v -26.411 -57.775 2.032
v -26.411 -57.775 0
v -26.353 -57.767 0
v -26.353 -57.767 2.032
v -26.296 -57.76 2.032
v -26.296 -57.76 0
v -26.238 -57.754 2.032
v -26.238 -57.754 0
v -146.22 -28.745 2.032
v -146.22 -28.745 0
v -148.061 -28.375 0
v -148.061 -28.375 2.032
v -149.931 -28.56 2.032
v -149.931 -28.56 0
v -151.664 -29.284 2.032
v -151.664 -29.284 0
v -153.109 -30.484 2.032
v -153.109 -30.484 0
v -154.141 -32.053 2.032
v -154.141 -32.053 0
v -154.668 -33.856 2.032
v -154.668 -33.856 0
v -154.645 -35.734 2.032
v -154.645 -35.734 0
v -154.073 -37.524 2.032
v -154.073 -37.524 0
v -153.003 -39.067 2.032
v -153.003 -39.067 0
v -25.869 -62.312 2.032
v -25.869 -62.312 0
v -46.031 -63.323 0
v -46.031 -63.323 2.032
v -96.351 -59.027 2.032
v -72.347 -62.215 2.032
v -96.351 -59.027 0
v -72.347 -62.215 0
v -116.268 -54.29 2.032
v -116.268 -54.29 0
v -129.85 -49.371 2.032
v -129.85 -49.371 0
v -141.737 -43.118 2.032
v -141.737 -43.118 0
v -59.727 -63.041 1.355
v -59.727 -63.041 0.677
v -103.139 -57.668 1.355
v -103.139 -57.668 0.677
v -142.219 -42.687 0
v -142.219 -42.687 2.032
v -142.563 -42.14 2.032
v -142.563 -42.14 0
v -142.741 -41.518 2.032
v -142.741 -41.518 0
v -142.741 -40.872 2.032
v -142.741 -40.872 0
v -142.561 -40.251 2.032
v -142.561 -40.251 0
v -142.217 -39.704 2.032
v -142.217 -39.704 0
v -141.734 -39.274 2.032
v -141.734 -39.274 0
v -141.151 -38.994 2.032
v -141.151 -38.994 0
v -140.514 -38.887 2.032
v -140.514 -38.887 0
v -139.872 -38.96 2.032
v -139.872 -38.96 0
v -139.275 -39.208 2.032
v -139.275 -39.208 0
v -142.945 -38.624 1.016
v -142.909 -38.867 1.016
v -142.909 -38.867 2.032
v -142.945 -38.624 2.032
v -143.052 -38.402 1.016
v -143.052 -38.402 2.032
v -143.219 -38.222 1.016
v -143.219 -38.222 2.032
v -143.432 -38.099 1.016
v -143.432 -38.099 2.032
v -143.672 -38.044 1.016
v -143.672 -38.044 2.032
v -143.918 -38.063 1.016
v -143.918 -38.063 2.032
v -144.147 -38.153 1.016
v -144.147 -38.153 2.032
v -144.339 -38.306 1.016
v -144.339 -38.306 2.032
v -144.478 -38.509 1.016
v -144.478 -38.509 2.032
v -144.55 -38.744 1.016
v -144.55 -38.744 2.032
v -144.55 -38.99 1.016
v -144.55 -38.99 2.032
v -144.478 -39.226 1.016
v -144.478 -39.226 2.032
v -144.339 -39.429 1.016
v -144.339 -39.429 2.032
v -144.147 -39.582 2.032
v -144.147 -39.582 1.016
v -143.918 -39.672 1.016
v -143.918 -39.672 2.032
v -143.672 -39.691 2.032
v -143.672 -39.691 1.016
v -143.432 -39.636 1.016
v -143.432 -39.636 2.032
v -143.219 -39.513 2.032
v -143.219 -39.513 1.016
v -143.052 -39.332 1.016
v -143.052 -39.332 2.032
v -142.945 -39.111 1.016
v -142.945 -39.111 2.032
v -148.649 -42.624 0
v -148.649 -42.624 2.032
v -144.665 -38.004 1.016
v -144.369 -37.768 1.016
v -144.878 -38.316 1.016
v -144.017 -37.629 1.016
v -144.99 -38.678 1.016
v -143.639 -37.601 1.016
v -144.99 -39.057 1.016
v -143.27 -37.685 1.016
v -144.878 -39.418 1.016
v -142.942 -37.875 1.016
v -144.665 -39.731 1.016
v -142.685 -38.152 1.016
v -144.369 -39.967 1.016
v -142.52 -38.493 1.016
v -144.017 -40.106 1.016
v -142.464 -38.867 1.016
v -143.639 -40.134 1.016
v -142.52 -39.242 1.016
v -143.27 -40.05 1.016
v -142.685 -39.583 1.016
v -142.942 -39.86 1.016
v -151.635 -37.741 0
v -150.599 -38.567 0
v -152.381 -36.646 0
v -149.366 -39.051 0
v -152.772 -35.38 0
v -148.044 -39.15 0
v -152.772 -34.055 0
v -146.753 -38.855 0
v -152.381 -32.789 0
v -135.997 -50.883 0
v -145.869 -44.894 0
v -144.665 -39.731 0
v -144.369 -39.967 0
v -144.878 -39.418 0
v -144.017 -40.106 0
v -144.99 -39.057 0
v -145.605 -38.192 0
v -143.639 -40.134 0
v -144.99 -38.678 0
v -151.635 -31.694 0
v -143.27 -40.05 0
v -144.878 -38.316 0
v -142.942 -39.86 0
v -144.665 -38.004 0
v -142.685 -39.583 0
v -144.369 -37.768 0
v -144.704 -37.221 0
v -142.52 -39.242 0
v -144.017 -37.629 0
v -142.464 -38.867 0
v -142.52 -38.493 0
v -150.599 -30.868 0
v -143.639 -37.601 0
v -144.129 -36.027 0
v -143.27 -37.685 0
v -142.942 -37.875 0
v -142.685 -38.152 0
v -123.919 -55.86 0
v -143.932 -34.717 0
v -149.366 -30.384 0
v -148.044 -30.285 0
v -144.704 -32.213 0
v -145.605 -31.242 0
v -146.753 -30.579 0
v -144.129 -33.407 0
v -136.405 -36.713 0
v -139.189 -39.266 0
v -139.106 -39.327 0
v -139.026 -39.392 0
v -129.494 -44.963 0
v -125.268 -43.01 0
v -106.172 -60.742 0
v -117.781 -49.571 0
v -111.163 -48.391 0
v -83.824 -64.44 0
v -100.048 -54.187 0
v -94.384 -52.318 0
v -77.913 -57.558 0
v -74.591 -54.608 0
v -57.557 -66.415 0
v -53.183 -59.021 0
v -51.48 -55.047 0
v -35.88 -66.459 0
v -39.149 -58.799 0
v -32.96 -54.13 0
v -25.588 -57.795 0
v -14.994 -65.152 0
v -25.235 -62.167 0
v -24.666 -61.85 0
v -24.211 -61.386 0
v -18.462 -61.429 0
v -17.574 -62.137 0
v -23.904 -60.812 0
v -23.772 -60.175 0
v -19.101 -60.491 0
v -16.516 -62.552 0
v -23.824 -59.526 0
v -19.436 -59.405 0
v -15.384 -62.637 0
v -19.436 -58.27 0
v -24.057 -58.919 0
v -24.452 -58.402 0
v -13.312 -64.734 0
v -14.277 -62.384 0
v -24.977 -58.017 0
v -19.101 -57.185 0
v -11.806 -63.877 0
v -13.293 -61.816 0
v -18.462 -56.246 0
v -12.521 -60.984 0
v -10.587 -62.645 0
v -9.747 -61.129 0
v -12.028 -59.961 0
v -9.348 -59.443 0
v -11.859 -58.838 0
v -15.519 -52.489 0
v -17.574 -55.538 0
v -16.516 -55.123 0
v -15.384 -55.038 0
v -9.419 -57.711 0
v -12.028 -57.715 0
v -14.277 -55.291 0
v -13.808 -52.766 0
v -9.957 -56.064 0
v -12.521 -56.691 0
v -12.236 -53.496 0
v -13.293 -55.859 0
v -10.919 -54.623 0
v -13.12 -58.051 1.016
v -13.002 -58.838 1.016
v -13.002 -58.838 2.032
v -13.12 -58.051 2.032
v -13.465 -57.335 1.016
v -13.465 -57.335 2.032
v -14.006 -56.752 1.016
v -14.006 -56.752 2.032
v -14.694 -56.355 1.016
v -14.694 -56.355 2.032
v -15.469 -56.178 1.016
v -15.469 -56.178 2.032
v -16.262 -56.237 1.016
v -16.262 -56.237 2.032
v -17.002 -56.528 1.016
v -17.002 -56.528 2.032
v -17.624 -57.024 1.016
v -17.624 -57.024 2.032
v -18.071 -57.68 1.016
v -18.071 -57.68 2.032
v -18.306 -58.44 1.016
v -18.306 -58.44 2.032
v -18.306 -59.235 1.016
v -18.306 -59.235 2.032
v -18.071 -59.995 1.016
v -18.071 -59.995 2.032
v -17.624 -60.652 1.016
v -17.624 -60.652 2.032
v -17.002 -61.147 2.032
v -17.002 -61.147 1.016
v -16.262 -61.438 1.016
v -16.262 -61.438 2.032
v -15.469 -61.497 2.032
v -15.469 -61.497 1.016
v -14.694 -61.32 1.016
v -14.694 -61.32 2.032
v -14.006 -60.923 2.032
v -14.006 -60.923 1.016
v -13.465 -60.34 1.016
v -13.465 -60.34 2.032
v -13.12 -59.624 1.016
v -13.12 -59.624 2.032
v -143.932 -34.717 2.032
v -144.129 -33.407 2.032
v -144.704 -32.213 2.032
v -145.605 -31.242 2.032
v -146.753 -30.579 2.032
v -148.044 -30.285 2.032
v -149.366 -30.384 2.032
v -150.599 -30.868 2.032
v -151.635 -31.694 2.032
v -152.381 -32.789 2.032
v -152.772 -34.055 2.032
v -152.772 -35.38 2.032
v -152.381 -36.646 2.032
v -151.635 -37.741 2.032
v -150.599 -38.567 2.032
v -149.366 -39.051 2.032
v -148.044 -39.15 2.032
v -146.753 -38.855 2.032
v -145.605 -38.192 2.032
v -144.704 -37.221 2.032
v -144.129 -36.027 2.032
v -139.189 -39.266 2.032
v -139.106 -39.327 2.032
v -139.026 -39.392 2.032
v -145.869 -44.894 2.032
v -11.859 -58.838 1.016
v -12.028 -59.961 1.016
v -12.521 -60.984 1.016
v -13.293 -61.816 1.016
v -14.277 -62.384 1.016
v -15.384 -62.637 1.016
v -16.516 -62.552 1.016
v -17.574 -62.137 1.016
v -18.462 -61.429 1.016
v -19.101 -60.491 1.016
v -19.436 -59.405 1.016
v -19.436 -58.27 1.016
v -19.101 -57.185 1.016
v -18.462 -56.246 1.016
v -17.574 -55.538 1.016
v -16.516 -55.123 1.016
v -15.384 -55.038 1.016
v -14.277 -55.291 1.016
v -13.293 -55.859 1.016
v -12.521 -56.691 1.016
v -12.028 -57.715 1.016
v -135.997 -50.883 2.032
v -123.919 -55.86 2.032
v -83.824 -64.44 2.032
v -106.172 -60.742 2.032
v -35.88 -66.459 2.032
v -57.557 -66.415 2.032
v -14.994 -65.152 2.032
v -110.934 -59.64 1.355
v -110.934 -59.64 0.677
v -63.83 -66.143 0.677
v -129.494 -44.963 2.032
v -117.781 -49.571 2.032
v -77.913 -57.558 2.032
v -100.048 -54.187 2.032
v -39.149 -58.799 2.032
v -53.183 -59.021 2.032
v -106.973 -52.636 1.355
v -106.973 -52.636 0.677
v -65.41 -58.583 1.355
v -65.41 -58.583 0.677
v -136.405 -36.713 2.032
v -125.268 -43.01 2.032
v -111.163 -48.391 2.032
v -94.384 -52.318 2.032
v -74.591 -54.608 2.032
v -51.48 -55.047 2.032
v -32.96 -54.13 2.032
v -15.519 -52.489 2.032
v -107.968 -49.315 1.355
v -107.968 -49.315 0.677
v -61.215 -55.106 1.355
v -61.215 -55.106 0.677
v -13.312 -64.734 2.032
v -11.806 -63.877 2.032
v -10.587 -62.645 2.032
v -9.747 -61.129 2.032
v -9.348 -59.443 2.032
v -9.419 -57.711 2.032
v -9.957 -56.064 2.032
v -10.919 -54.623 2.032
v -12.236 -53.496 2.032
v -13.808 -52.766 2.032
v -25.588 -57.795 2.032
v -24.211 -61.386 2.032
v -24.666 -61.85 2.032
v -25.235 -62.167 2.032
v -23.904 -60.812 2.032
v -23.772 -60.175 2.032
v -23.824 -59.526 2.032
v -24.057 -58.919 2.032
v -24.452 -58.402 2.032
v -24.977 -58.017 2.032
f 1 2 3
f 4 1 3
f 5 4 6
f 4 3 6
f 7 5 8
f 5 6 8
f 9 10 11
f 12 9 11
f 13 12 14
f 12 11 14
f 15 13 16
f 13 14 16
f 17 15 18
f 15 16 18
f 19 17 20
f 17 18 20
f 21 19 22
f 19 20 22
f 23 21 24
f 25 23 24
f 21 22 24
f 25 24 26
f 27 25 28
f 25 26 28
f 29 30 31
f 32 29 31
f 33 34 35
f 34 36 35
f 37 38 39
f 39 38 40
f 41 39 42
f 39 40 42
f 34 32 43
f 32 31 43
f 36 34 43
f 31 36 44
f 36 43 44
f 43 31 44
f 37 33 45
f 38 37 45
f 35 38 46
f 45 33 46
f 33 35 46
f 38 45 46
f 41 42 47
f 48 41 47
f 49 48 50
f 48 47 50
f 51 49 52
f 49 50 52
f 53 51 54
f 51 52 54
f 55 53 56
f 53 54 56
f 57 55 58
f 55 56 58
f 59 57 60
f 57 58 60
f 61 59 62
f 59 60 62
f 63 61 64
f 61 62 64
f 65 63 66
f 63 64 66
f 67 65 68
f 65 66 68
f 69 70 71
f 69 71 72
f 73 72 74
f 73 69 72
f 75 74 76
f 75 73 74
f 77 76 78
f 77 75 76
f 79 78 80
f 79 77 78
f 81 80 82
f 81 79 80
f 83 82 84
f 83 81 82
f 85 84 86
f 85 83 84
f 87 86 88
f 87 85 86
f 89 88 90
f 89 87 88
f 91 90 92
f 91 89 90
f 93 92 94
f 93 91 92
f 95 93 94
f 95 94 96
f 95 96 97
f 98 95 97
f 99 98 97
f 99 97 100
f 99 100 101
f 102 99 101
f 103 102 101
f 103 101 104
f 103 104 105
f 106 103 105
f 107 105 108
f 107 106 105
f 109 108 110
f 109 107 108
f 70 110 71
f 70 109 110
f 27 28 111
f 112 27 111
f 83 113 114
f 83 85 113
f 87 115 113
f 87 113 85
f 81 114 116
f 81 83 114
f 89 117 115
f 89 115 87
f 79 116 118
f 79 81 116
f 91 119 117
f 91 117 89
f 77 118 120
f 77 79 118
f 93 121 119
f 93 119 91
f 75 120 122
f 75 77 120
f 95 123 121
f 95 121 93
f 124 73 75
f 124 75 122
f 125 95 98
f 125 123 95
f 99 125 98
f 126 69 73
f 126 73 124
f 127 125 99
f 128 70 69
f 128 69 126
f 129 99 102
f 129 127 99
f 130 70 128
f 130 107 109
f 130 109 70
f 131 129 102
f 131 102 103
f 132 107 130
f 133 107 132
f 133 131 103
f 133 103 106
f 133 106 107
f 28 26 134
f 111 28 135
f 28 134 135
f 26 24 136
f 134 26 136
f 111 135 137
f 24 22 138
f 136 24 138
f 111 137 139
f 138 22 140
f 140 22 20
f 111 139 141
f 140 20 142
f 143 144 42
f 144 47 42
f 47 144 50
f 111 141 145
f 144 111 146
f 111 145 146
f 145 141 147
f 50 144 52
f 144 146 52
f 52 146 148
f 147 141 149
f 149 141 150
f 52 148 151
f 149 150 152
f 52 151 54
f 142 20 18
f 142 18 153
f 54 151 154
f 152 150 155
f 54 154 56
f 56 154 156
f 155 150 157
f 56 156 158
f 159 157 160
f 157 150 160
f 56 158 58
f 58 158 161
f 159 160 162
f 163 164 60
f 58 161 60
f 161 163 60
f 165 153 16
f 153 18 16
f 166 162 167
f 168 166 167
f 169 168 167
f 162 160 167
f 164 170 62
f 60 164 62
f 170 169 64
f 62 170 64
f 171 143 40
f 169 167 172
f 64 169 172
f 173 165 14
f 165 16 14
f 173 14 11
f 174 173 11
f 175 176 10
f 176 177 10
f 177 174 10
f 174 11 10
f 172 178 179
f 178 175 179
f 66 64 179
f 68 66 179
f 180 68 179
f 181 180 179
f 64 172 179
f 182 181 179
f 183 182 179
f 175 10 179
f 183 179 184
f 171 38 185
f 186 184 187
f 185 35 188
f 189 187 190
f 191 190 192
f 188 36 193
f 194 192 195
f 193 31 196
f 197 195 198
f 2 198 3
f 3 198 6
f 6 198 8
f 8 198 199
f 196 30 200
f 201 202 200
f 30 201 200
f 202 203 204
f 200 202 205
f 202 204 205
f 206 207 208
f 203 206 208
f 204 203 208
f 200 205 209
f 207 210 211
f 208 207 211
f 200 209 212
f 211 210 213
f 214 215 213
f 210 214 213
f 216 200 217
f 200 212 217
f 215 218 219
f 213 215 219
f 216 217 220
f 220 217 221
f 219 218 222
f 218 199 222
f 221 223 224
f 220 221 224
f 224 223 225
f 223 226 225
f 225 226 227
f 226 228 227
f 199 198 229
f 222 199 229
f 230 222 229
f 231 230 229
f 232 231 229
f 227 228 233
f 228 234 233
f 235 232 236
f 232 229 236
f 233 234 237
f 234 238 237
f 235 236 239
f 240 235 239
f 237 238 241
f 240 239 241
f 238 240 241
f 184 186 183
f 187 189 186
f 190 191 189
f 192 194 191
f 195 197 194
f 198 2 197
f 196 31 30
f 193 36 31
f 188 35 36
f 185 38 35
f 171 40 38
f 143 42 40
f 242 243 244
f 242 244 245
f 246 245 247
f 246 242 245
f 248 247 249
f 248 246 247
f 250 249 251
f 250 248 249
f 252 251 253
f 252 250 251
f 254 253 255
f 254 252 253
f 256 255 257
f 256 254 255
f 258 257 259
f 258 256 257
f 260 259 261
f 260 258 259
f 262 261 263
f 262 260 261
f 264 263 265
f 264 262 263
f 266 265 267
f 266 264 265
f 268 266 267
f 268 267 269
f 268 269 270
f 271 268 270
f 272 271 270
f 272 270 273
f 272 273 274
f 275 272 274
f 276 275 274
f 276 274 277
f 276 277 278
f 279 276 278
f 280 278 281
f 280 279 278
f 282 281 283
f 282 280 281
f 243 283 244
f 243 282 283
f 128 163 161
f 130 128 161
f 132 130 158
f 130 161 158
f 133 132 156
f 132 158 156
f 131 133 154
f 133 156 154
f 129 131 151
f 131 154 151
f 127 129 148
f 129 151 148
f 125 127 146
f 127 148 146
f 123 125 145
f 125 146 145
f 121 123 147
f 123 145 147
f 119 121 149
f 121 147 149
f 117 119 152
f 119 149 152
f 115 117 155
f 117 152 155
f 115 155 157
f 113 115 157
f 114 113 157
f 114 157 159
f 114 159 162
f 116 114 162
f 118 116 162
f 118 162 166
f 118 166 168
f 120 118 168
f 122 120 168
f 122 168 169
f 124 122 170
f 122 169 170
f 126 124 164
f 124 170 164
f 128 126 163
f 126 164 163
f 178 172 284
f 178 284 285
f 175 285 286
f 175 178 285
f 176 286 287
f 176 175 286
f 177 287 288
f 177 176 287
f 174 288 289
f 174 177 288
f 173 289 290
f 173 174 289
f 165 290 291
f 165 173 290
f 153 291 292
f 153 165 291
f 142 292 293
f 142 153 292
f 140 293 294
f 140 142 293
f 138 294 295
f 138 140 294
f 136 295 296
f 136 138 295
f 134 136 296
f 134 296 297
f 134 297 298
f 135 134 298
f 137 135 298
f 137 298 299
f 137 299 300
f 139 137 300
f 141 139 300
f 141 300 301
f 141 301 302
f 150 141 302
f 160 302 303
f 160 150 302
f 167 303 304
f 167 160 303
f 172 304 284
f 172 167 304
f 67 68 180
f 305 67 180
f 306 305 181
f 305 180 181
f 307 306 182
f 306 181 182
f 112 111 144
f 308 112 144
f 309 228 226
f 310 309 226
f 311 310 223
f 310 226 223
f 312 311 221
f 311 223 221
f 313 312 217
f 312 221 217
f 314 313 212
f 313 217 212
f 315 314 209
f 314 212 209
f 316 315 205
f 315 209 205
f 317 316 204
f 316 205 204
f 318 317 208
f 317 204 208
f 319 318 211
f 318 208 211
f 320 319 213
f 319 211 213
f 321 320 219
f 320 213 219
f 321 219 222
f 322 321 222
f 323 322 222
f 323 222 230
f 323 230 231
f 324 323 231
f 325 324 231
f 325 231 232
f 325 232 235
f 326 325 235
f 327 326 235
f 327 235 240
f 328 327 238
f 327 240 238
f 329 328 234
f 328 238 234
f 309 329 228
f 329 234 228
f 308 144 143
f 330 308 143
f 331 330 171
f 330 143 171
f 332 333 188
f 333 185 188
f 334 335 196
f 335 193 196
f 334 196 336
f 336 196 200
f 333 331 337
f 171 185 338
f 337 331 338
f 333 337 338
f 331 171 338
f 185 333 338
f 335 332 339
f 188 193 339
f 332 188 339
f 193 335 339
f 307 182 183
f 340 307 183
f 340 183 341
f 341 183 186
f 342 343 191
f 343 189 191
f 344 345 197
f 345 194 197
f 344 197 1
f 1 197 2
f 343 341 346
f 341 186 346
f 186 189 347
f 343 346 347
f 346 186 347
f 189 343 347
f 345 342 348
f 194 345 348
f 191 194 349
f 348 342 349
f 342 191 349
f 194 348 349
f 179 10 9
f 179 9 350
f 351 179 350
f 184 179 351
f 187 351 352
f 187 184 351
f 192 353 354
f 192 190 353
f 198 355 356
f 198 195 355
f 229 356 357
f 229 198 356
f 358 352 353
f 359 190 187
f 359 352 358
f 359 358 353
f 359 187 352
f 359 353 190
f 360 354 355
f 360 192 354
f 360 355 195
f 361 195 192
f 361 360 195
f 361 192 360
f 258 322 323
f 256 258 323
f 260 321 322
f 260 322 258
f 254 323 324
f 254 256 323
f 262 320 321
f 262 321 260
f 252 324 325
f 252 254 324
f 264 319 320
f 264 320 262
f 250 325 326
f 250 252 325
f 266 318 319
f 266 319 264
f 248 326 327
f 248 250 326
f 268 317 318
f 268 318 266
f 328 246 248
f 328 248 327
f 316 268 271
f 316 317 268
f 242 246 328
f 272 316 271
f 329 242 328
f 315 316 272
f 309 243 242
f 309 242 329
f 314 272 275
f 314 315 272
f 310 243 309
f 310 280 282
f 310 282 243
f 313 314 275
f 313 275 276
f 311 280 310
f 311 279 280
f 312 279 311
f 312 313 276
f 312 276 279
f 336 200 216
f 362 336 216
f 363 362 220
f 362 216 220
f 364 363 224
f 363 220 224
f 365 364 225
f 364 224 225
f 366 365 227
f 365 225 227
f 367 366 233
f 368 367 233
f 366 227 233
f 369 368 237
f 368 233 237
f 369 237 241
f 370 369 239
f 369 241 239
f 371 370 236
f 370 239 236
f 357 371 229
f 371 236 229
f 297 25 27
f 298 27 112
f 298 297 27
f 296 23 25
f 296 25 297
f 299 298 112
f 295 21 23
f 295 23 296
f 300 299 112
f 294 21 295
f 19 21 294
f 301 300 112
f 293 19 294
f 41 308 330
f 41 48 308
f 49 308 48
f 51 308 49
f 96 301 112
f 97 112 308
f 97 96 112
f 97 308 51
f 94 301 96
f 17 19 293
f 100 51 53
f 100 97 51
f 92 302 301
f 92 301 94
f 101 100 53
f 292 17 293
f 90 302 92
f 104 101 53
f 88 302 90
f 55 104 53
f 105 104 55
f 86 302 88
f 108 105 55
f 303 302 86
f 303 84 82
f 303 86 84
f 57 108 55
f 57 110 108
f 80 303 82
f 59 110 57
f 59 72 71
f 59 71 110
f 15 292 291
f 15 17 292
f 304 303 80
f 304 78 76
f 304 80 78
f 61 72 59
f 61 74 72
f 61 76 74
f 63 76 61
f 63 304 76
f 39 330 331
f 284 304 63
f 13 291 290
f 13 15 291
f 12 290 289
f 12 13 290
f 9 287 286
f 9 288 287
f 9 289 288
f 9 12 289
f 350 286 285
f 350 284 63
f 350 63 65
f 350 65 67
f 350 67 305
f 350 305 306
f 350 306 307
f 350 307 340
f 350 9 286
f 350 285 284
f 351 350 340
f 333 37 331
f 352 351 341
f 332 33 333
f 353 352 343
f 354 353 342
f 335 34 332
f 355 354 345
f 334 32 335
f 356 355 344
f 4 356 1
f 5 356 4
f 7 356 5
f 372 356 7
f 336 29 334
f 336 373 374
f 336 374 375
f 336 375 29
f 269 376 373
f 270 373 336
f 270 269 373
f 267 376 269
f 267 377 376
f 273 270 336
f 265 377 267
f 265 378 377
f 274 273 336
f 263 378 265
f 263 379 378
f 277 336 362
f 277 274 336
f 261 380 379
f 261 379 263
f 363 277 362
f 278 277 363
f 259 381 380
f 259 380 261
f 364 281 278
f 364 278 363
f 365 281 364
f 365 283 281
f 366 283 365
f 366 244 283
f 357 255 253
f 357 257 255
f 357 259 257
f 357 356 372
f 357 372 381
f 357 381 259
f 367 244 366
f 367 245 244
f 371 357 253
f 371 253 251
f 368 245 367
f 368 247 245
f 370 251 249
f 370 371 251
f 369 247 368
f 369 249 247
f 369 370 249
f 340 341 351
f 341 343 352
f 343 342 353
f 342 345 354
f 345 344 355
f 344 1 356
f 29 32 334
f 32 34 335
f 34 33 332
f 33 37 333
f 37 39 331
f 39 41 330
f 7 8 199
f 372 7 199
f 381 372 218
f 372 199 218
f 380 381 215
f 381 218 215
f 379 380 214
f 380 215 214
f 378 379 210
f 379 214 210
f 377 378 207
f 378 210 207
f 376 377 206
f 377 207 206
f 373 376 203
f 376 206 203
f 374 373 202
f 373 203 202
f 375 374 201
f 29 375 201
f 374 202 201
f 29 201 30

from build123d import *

# Parameters (mm, degrees)
F0_R      = 2.667
F0_R_2    = 4.445
F1_DEPTH  = 2.032
F2_R      = 3.81
F2_R_2    = 2.667
F3_DEPTH  = 1.016
F4_R      = 0.8255
F5_DEPTH  = 25.4
F6_R      = 1.27
F6_R_2    = 0.8255
F7_DEPTH  = 1.016
F8_DEPTH  = 1.016
F9_R      = 1.27
F9_R_2    = 0.8255
F9_R_3    = 3.81
F9_R_4    = 2.667
F10_DEPTH = 1.016


with BuildPart() as f1:
    # F0 (on Top) → F1 (new body)
    with BuildSketch(Plane.XY):
        with BuildLine():
            add(Edge.make_bspline(
                [(-145.8688657386, -44.8941665066), (-120.4979013513, -64.0094905591), (-61.2157028163, -69.6417423021), (-14.9939787657, -65.1516662724)],
                knots=[9.1704042636, 9.1704042636, 9.1704042636, 9.1704042636, 137.9629328019, 137.9629328019, 137.9629328019, 137.9629328019], degree=3))
            ThreePointArc((-14.9939787657, -65.1516662724), (-9.3240486247, -58.5746731476), (-15.5187291961, -52.4893729096))
            add(Edge.make_bspline(
                [(-146.219773699, -28.7446715558), (-115.4057267109, -58.8297417696), (-57.5004960396, -57.185757191), (-15.5187291961, -52.4893729096)],
                knots=[0, 0, 0, 0, 132.8404075443, 132.8404075443, 132.8404075443, 132.8404075443], degree=3))
            ThreePointArc((-146.219773699, -28.7446715558), (-153.6835655793, -31.2301073118), (-153.0025163181, -39.0673103865))
            Line((-153.0025163181, -39.0673103865), (-148.6487479934, -42.6235234818))
            Line((-148.6487479934, -42.6235234818), (-145.8688657386, -44.8941665066))
        make_face()
        with BuildLine():
            ThreePointArc((-139.2748018361, -39.2084827255), (-139.1474453557, -39.29610811), (-139.0263023063, -39.3921406184))
            add(Edge.make_bspline(
                [(-139.0263023063, -39.3921406184), (-115.7533807903, -56.4645604087), (-60.1022871914, -61.7792620614), (-26.4109737279, -57.7751529221)],
                knots=[0.4075873512, 0.4075873512, 0.4075873512, 0.4075873512, 114.3528485972, 114.3528485972, 114.3528485972, 114.3528485972], degree=3))
            ThreePointArc((-26.4109737279, -57.7751529221), (-26.3245090015, -57.7631456427), (-26.237648884, -57.754448306))
            ThreePointArc((-26.237648884, -57.754448306), (-23.7748016763, -59.8487204067), (-25.869073777, -62.3115676144))
            add(Edge.make_bspline(
                [(-25.869073777, -62.3115676144), (-50.1594431698, -65.0675445795), (-110.3361174464, -63.282199204), (-141.7372077703, -43.1182831526)],
                knots=[0, 0, 0, 0, 117.4470376107, 117.4470376107, 117.4470376107, 117.4470376107], degree=3))
            ThreePointArc((-141.7372077703, -43.1182831526), (-142.408403822, -39.9652454073), (-139.2748018361, -39.2084827255))
        make_face(mode=Mode.SUBTRACT)
        with Locations((-15.6686027753, -58.8376039948)):
            Circle(F0_R, mode=Mode.SUBTRACT)
        with Locations((-148.3766692678, -34.7171334858)):
            Circle(F0_R_2, mode=Mode.SUBTRACT)
    extrude(amount=F1_DEPTH)

    # F2 (on face) → F3 (cut)
    with BuildSketch(Plane.XY.offset(2.032)):
        with Locations((-15.6686027753, -58.8376039948)):
            Circle(F2_R)
        with Locations((-15.6686027753, -58.8376039948)):
            Circle(F2_R_2, mode=Mode.SUBTRACT)
    extrude(amount=-F3_DEPTH, mode=Mode.SUBTRACT)

    # F4 (on face) → F5 (cut)
    with BuildSketch(Plane.XY.offset(2.032)):
        with Locations((-143.7340378761, -38.8674512506)):
            Circle(F4_R)
    extrude(amount=-F5_DEPTH, mode=Mode.SUBTRACT)

    # F6 (on face) → F7 (cut)
    with BuildSketch(Plane.XY.offset(2.032)):
        with Locations((-143.7340378761, -38.8674512506)):
            Circle(F6_R)
        with Locations((-143.7340378761, -38.8674512506)):
            Circle(F6_R_2, mode=Mode.SUBTRACT)
    extrude(amount=-F7_DEPTH, mode=Mode.SUBTRACT)

    # F8 (add, through all): faces of the model
    f8_faces = [f1.faces().sort_by_distance(p)[0] for p in [
        (-144.9681168516, -38.8674512506, 1.016),
        (-19.3708397018, -58.8376039948, 1.016),
    ]]
    extrude(f8_faces, amount=F8_DEPTH)

    # F9 (on face) → F10 (cut)
    with BuildSketch(Plane(origin=(0, 0, 0), x_dir=(1, 0, 0), z_dir=(0, 0, -1))):
        with Locations((-143.7340378761, 38.8674512506)):
            Circle(F9_R)
        with Locations((-143.7340378761, 38.8674512506)):
            Circle(F9_R_2, mode=Mode.SUBTRACT)
        with Locations((-15.6686027753, 58.8376039948)):
            Circle(F9_R_3)
        with Locations((-15.6686027753, 58.8376039948)):
            Circle(F9_R_4, mode=Mode.SUBTRACT)
    extrude(amount=-F10_DEPTH, mode=Mode.SUBTRACT)


solid = f1.part
